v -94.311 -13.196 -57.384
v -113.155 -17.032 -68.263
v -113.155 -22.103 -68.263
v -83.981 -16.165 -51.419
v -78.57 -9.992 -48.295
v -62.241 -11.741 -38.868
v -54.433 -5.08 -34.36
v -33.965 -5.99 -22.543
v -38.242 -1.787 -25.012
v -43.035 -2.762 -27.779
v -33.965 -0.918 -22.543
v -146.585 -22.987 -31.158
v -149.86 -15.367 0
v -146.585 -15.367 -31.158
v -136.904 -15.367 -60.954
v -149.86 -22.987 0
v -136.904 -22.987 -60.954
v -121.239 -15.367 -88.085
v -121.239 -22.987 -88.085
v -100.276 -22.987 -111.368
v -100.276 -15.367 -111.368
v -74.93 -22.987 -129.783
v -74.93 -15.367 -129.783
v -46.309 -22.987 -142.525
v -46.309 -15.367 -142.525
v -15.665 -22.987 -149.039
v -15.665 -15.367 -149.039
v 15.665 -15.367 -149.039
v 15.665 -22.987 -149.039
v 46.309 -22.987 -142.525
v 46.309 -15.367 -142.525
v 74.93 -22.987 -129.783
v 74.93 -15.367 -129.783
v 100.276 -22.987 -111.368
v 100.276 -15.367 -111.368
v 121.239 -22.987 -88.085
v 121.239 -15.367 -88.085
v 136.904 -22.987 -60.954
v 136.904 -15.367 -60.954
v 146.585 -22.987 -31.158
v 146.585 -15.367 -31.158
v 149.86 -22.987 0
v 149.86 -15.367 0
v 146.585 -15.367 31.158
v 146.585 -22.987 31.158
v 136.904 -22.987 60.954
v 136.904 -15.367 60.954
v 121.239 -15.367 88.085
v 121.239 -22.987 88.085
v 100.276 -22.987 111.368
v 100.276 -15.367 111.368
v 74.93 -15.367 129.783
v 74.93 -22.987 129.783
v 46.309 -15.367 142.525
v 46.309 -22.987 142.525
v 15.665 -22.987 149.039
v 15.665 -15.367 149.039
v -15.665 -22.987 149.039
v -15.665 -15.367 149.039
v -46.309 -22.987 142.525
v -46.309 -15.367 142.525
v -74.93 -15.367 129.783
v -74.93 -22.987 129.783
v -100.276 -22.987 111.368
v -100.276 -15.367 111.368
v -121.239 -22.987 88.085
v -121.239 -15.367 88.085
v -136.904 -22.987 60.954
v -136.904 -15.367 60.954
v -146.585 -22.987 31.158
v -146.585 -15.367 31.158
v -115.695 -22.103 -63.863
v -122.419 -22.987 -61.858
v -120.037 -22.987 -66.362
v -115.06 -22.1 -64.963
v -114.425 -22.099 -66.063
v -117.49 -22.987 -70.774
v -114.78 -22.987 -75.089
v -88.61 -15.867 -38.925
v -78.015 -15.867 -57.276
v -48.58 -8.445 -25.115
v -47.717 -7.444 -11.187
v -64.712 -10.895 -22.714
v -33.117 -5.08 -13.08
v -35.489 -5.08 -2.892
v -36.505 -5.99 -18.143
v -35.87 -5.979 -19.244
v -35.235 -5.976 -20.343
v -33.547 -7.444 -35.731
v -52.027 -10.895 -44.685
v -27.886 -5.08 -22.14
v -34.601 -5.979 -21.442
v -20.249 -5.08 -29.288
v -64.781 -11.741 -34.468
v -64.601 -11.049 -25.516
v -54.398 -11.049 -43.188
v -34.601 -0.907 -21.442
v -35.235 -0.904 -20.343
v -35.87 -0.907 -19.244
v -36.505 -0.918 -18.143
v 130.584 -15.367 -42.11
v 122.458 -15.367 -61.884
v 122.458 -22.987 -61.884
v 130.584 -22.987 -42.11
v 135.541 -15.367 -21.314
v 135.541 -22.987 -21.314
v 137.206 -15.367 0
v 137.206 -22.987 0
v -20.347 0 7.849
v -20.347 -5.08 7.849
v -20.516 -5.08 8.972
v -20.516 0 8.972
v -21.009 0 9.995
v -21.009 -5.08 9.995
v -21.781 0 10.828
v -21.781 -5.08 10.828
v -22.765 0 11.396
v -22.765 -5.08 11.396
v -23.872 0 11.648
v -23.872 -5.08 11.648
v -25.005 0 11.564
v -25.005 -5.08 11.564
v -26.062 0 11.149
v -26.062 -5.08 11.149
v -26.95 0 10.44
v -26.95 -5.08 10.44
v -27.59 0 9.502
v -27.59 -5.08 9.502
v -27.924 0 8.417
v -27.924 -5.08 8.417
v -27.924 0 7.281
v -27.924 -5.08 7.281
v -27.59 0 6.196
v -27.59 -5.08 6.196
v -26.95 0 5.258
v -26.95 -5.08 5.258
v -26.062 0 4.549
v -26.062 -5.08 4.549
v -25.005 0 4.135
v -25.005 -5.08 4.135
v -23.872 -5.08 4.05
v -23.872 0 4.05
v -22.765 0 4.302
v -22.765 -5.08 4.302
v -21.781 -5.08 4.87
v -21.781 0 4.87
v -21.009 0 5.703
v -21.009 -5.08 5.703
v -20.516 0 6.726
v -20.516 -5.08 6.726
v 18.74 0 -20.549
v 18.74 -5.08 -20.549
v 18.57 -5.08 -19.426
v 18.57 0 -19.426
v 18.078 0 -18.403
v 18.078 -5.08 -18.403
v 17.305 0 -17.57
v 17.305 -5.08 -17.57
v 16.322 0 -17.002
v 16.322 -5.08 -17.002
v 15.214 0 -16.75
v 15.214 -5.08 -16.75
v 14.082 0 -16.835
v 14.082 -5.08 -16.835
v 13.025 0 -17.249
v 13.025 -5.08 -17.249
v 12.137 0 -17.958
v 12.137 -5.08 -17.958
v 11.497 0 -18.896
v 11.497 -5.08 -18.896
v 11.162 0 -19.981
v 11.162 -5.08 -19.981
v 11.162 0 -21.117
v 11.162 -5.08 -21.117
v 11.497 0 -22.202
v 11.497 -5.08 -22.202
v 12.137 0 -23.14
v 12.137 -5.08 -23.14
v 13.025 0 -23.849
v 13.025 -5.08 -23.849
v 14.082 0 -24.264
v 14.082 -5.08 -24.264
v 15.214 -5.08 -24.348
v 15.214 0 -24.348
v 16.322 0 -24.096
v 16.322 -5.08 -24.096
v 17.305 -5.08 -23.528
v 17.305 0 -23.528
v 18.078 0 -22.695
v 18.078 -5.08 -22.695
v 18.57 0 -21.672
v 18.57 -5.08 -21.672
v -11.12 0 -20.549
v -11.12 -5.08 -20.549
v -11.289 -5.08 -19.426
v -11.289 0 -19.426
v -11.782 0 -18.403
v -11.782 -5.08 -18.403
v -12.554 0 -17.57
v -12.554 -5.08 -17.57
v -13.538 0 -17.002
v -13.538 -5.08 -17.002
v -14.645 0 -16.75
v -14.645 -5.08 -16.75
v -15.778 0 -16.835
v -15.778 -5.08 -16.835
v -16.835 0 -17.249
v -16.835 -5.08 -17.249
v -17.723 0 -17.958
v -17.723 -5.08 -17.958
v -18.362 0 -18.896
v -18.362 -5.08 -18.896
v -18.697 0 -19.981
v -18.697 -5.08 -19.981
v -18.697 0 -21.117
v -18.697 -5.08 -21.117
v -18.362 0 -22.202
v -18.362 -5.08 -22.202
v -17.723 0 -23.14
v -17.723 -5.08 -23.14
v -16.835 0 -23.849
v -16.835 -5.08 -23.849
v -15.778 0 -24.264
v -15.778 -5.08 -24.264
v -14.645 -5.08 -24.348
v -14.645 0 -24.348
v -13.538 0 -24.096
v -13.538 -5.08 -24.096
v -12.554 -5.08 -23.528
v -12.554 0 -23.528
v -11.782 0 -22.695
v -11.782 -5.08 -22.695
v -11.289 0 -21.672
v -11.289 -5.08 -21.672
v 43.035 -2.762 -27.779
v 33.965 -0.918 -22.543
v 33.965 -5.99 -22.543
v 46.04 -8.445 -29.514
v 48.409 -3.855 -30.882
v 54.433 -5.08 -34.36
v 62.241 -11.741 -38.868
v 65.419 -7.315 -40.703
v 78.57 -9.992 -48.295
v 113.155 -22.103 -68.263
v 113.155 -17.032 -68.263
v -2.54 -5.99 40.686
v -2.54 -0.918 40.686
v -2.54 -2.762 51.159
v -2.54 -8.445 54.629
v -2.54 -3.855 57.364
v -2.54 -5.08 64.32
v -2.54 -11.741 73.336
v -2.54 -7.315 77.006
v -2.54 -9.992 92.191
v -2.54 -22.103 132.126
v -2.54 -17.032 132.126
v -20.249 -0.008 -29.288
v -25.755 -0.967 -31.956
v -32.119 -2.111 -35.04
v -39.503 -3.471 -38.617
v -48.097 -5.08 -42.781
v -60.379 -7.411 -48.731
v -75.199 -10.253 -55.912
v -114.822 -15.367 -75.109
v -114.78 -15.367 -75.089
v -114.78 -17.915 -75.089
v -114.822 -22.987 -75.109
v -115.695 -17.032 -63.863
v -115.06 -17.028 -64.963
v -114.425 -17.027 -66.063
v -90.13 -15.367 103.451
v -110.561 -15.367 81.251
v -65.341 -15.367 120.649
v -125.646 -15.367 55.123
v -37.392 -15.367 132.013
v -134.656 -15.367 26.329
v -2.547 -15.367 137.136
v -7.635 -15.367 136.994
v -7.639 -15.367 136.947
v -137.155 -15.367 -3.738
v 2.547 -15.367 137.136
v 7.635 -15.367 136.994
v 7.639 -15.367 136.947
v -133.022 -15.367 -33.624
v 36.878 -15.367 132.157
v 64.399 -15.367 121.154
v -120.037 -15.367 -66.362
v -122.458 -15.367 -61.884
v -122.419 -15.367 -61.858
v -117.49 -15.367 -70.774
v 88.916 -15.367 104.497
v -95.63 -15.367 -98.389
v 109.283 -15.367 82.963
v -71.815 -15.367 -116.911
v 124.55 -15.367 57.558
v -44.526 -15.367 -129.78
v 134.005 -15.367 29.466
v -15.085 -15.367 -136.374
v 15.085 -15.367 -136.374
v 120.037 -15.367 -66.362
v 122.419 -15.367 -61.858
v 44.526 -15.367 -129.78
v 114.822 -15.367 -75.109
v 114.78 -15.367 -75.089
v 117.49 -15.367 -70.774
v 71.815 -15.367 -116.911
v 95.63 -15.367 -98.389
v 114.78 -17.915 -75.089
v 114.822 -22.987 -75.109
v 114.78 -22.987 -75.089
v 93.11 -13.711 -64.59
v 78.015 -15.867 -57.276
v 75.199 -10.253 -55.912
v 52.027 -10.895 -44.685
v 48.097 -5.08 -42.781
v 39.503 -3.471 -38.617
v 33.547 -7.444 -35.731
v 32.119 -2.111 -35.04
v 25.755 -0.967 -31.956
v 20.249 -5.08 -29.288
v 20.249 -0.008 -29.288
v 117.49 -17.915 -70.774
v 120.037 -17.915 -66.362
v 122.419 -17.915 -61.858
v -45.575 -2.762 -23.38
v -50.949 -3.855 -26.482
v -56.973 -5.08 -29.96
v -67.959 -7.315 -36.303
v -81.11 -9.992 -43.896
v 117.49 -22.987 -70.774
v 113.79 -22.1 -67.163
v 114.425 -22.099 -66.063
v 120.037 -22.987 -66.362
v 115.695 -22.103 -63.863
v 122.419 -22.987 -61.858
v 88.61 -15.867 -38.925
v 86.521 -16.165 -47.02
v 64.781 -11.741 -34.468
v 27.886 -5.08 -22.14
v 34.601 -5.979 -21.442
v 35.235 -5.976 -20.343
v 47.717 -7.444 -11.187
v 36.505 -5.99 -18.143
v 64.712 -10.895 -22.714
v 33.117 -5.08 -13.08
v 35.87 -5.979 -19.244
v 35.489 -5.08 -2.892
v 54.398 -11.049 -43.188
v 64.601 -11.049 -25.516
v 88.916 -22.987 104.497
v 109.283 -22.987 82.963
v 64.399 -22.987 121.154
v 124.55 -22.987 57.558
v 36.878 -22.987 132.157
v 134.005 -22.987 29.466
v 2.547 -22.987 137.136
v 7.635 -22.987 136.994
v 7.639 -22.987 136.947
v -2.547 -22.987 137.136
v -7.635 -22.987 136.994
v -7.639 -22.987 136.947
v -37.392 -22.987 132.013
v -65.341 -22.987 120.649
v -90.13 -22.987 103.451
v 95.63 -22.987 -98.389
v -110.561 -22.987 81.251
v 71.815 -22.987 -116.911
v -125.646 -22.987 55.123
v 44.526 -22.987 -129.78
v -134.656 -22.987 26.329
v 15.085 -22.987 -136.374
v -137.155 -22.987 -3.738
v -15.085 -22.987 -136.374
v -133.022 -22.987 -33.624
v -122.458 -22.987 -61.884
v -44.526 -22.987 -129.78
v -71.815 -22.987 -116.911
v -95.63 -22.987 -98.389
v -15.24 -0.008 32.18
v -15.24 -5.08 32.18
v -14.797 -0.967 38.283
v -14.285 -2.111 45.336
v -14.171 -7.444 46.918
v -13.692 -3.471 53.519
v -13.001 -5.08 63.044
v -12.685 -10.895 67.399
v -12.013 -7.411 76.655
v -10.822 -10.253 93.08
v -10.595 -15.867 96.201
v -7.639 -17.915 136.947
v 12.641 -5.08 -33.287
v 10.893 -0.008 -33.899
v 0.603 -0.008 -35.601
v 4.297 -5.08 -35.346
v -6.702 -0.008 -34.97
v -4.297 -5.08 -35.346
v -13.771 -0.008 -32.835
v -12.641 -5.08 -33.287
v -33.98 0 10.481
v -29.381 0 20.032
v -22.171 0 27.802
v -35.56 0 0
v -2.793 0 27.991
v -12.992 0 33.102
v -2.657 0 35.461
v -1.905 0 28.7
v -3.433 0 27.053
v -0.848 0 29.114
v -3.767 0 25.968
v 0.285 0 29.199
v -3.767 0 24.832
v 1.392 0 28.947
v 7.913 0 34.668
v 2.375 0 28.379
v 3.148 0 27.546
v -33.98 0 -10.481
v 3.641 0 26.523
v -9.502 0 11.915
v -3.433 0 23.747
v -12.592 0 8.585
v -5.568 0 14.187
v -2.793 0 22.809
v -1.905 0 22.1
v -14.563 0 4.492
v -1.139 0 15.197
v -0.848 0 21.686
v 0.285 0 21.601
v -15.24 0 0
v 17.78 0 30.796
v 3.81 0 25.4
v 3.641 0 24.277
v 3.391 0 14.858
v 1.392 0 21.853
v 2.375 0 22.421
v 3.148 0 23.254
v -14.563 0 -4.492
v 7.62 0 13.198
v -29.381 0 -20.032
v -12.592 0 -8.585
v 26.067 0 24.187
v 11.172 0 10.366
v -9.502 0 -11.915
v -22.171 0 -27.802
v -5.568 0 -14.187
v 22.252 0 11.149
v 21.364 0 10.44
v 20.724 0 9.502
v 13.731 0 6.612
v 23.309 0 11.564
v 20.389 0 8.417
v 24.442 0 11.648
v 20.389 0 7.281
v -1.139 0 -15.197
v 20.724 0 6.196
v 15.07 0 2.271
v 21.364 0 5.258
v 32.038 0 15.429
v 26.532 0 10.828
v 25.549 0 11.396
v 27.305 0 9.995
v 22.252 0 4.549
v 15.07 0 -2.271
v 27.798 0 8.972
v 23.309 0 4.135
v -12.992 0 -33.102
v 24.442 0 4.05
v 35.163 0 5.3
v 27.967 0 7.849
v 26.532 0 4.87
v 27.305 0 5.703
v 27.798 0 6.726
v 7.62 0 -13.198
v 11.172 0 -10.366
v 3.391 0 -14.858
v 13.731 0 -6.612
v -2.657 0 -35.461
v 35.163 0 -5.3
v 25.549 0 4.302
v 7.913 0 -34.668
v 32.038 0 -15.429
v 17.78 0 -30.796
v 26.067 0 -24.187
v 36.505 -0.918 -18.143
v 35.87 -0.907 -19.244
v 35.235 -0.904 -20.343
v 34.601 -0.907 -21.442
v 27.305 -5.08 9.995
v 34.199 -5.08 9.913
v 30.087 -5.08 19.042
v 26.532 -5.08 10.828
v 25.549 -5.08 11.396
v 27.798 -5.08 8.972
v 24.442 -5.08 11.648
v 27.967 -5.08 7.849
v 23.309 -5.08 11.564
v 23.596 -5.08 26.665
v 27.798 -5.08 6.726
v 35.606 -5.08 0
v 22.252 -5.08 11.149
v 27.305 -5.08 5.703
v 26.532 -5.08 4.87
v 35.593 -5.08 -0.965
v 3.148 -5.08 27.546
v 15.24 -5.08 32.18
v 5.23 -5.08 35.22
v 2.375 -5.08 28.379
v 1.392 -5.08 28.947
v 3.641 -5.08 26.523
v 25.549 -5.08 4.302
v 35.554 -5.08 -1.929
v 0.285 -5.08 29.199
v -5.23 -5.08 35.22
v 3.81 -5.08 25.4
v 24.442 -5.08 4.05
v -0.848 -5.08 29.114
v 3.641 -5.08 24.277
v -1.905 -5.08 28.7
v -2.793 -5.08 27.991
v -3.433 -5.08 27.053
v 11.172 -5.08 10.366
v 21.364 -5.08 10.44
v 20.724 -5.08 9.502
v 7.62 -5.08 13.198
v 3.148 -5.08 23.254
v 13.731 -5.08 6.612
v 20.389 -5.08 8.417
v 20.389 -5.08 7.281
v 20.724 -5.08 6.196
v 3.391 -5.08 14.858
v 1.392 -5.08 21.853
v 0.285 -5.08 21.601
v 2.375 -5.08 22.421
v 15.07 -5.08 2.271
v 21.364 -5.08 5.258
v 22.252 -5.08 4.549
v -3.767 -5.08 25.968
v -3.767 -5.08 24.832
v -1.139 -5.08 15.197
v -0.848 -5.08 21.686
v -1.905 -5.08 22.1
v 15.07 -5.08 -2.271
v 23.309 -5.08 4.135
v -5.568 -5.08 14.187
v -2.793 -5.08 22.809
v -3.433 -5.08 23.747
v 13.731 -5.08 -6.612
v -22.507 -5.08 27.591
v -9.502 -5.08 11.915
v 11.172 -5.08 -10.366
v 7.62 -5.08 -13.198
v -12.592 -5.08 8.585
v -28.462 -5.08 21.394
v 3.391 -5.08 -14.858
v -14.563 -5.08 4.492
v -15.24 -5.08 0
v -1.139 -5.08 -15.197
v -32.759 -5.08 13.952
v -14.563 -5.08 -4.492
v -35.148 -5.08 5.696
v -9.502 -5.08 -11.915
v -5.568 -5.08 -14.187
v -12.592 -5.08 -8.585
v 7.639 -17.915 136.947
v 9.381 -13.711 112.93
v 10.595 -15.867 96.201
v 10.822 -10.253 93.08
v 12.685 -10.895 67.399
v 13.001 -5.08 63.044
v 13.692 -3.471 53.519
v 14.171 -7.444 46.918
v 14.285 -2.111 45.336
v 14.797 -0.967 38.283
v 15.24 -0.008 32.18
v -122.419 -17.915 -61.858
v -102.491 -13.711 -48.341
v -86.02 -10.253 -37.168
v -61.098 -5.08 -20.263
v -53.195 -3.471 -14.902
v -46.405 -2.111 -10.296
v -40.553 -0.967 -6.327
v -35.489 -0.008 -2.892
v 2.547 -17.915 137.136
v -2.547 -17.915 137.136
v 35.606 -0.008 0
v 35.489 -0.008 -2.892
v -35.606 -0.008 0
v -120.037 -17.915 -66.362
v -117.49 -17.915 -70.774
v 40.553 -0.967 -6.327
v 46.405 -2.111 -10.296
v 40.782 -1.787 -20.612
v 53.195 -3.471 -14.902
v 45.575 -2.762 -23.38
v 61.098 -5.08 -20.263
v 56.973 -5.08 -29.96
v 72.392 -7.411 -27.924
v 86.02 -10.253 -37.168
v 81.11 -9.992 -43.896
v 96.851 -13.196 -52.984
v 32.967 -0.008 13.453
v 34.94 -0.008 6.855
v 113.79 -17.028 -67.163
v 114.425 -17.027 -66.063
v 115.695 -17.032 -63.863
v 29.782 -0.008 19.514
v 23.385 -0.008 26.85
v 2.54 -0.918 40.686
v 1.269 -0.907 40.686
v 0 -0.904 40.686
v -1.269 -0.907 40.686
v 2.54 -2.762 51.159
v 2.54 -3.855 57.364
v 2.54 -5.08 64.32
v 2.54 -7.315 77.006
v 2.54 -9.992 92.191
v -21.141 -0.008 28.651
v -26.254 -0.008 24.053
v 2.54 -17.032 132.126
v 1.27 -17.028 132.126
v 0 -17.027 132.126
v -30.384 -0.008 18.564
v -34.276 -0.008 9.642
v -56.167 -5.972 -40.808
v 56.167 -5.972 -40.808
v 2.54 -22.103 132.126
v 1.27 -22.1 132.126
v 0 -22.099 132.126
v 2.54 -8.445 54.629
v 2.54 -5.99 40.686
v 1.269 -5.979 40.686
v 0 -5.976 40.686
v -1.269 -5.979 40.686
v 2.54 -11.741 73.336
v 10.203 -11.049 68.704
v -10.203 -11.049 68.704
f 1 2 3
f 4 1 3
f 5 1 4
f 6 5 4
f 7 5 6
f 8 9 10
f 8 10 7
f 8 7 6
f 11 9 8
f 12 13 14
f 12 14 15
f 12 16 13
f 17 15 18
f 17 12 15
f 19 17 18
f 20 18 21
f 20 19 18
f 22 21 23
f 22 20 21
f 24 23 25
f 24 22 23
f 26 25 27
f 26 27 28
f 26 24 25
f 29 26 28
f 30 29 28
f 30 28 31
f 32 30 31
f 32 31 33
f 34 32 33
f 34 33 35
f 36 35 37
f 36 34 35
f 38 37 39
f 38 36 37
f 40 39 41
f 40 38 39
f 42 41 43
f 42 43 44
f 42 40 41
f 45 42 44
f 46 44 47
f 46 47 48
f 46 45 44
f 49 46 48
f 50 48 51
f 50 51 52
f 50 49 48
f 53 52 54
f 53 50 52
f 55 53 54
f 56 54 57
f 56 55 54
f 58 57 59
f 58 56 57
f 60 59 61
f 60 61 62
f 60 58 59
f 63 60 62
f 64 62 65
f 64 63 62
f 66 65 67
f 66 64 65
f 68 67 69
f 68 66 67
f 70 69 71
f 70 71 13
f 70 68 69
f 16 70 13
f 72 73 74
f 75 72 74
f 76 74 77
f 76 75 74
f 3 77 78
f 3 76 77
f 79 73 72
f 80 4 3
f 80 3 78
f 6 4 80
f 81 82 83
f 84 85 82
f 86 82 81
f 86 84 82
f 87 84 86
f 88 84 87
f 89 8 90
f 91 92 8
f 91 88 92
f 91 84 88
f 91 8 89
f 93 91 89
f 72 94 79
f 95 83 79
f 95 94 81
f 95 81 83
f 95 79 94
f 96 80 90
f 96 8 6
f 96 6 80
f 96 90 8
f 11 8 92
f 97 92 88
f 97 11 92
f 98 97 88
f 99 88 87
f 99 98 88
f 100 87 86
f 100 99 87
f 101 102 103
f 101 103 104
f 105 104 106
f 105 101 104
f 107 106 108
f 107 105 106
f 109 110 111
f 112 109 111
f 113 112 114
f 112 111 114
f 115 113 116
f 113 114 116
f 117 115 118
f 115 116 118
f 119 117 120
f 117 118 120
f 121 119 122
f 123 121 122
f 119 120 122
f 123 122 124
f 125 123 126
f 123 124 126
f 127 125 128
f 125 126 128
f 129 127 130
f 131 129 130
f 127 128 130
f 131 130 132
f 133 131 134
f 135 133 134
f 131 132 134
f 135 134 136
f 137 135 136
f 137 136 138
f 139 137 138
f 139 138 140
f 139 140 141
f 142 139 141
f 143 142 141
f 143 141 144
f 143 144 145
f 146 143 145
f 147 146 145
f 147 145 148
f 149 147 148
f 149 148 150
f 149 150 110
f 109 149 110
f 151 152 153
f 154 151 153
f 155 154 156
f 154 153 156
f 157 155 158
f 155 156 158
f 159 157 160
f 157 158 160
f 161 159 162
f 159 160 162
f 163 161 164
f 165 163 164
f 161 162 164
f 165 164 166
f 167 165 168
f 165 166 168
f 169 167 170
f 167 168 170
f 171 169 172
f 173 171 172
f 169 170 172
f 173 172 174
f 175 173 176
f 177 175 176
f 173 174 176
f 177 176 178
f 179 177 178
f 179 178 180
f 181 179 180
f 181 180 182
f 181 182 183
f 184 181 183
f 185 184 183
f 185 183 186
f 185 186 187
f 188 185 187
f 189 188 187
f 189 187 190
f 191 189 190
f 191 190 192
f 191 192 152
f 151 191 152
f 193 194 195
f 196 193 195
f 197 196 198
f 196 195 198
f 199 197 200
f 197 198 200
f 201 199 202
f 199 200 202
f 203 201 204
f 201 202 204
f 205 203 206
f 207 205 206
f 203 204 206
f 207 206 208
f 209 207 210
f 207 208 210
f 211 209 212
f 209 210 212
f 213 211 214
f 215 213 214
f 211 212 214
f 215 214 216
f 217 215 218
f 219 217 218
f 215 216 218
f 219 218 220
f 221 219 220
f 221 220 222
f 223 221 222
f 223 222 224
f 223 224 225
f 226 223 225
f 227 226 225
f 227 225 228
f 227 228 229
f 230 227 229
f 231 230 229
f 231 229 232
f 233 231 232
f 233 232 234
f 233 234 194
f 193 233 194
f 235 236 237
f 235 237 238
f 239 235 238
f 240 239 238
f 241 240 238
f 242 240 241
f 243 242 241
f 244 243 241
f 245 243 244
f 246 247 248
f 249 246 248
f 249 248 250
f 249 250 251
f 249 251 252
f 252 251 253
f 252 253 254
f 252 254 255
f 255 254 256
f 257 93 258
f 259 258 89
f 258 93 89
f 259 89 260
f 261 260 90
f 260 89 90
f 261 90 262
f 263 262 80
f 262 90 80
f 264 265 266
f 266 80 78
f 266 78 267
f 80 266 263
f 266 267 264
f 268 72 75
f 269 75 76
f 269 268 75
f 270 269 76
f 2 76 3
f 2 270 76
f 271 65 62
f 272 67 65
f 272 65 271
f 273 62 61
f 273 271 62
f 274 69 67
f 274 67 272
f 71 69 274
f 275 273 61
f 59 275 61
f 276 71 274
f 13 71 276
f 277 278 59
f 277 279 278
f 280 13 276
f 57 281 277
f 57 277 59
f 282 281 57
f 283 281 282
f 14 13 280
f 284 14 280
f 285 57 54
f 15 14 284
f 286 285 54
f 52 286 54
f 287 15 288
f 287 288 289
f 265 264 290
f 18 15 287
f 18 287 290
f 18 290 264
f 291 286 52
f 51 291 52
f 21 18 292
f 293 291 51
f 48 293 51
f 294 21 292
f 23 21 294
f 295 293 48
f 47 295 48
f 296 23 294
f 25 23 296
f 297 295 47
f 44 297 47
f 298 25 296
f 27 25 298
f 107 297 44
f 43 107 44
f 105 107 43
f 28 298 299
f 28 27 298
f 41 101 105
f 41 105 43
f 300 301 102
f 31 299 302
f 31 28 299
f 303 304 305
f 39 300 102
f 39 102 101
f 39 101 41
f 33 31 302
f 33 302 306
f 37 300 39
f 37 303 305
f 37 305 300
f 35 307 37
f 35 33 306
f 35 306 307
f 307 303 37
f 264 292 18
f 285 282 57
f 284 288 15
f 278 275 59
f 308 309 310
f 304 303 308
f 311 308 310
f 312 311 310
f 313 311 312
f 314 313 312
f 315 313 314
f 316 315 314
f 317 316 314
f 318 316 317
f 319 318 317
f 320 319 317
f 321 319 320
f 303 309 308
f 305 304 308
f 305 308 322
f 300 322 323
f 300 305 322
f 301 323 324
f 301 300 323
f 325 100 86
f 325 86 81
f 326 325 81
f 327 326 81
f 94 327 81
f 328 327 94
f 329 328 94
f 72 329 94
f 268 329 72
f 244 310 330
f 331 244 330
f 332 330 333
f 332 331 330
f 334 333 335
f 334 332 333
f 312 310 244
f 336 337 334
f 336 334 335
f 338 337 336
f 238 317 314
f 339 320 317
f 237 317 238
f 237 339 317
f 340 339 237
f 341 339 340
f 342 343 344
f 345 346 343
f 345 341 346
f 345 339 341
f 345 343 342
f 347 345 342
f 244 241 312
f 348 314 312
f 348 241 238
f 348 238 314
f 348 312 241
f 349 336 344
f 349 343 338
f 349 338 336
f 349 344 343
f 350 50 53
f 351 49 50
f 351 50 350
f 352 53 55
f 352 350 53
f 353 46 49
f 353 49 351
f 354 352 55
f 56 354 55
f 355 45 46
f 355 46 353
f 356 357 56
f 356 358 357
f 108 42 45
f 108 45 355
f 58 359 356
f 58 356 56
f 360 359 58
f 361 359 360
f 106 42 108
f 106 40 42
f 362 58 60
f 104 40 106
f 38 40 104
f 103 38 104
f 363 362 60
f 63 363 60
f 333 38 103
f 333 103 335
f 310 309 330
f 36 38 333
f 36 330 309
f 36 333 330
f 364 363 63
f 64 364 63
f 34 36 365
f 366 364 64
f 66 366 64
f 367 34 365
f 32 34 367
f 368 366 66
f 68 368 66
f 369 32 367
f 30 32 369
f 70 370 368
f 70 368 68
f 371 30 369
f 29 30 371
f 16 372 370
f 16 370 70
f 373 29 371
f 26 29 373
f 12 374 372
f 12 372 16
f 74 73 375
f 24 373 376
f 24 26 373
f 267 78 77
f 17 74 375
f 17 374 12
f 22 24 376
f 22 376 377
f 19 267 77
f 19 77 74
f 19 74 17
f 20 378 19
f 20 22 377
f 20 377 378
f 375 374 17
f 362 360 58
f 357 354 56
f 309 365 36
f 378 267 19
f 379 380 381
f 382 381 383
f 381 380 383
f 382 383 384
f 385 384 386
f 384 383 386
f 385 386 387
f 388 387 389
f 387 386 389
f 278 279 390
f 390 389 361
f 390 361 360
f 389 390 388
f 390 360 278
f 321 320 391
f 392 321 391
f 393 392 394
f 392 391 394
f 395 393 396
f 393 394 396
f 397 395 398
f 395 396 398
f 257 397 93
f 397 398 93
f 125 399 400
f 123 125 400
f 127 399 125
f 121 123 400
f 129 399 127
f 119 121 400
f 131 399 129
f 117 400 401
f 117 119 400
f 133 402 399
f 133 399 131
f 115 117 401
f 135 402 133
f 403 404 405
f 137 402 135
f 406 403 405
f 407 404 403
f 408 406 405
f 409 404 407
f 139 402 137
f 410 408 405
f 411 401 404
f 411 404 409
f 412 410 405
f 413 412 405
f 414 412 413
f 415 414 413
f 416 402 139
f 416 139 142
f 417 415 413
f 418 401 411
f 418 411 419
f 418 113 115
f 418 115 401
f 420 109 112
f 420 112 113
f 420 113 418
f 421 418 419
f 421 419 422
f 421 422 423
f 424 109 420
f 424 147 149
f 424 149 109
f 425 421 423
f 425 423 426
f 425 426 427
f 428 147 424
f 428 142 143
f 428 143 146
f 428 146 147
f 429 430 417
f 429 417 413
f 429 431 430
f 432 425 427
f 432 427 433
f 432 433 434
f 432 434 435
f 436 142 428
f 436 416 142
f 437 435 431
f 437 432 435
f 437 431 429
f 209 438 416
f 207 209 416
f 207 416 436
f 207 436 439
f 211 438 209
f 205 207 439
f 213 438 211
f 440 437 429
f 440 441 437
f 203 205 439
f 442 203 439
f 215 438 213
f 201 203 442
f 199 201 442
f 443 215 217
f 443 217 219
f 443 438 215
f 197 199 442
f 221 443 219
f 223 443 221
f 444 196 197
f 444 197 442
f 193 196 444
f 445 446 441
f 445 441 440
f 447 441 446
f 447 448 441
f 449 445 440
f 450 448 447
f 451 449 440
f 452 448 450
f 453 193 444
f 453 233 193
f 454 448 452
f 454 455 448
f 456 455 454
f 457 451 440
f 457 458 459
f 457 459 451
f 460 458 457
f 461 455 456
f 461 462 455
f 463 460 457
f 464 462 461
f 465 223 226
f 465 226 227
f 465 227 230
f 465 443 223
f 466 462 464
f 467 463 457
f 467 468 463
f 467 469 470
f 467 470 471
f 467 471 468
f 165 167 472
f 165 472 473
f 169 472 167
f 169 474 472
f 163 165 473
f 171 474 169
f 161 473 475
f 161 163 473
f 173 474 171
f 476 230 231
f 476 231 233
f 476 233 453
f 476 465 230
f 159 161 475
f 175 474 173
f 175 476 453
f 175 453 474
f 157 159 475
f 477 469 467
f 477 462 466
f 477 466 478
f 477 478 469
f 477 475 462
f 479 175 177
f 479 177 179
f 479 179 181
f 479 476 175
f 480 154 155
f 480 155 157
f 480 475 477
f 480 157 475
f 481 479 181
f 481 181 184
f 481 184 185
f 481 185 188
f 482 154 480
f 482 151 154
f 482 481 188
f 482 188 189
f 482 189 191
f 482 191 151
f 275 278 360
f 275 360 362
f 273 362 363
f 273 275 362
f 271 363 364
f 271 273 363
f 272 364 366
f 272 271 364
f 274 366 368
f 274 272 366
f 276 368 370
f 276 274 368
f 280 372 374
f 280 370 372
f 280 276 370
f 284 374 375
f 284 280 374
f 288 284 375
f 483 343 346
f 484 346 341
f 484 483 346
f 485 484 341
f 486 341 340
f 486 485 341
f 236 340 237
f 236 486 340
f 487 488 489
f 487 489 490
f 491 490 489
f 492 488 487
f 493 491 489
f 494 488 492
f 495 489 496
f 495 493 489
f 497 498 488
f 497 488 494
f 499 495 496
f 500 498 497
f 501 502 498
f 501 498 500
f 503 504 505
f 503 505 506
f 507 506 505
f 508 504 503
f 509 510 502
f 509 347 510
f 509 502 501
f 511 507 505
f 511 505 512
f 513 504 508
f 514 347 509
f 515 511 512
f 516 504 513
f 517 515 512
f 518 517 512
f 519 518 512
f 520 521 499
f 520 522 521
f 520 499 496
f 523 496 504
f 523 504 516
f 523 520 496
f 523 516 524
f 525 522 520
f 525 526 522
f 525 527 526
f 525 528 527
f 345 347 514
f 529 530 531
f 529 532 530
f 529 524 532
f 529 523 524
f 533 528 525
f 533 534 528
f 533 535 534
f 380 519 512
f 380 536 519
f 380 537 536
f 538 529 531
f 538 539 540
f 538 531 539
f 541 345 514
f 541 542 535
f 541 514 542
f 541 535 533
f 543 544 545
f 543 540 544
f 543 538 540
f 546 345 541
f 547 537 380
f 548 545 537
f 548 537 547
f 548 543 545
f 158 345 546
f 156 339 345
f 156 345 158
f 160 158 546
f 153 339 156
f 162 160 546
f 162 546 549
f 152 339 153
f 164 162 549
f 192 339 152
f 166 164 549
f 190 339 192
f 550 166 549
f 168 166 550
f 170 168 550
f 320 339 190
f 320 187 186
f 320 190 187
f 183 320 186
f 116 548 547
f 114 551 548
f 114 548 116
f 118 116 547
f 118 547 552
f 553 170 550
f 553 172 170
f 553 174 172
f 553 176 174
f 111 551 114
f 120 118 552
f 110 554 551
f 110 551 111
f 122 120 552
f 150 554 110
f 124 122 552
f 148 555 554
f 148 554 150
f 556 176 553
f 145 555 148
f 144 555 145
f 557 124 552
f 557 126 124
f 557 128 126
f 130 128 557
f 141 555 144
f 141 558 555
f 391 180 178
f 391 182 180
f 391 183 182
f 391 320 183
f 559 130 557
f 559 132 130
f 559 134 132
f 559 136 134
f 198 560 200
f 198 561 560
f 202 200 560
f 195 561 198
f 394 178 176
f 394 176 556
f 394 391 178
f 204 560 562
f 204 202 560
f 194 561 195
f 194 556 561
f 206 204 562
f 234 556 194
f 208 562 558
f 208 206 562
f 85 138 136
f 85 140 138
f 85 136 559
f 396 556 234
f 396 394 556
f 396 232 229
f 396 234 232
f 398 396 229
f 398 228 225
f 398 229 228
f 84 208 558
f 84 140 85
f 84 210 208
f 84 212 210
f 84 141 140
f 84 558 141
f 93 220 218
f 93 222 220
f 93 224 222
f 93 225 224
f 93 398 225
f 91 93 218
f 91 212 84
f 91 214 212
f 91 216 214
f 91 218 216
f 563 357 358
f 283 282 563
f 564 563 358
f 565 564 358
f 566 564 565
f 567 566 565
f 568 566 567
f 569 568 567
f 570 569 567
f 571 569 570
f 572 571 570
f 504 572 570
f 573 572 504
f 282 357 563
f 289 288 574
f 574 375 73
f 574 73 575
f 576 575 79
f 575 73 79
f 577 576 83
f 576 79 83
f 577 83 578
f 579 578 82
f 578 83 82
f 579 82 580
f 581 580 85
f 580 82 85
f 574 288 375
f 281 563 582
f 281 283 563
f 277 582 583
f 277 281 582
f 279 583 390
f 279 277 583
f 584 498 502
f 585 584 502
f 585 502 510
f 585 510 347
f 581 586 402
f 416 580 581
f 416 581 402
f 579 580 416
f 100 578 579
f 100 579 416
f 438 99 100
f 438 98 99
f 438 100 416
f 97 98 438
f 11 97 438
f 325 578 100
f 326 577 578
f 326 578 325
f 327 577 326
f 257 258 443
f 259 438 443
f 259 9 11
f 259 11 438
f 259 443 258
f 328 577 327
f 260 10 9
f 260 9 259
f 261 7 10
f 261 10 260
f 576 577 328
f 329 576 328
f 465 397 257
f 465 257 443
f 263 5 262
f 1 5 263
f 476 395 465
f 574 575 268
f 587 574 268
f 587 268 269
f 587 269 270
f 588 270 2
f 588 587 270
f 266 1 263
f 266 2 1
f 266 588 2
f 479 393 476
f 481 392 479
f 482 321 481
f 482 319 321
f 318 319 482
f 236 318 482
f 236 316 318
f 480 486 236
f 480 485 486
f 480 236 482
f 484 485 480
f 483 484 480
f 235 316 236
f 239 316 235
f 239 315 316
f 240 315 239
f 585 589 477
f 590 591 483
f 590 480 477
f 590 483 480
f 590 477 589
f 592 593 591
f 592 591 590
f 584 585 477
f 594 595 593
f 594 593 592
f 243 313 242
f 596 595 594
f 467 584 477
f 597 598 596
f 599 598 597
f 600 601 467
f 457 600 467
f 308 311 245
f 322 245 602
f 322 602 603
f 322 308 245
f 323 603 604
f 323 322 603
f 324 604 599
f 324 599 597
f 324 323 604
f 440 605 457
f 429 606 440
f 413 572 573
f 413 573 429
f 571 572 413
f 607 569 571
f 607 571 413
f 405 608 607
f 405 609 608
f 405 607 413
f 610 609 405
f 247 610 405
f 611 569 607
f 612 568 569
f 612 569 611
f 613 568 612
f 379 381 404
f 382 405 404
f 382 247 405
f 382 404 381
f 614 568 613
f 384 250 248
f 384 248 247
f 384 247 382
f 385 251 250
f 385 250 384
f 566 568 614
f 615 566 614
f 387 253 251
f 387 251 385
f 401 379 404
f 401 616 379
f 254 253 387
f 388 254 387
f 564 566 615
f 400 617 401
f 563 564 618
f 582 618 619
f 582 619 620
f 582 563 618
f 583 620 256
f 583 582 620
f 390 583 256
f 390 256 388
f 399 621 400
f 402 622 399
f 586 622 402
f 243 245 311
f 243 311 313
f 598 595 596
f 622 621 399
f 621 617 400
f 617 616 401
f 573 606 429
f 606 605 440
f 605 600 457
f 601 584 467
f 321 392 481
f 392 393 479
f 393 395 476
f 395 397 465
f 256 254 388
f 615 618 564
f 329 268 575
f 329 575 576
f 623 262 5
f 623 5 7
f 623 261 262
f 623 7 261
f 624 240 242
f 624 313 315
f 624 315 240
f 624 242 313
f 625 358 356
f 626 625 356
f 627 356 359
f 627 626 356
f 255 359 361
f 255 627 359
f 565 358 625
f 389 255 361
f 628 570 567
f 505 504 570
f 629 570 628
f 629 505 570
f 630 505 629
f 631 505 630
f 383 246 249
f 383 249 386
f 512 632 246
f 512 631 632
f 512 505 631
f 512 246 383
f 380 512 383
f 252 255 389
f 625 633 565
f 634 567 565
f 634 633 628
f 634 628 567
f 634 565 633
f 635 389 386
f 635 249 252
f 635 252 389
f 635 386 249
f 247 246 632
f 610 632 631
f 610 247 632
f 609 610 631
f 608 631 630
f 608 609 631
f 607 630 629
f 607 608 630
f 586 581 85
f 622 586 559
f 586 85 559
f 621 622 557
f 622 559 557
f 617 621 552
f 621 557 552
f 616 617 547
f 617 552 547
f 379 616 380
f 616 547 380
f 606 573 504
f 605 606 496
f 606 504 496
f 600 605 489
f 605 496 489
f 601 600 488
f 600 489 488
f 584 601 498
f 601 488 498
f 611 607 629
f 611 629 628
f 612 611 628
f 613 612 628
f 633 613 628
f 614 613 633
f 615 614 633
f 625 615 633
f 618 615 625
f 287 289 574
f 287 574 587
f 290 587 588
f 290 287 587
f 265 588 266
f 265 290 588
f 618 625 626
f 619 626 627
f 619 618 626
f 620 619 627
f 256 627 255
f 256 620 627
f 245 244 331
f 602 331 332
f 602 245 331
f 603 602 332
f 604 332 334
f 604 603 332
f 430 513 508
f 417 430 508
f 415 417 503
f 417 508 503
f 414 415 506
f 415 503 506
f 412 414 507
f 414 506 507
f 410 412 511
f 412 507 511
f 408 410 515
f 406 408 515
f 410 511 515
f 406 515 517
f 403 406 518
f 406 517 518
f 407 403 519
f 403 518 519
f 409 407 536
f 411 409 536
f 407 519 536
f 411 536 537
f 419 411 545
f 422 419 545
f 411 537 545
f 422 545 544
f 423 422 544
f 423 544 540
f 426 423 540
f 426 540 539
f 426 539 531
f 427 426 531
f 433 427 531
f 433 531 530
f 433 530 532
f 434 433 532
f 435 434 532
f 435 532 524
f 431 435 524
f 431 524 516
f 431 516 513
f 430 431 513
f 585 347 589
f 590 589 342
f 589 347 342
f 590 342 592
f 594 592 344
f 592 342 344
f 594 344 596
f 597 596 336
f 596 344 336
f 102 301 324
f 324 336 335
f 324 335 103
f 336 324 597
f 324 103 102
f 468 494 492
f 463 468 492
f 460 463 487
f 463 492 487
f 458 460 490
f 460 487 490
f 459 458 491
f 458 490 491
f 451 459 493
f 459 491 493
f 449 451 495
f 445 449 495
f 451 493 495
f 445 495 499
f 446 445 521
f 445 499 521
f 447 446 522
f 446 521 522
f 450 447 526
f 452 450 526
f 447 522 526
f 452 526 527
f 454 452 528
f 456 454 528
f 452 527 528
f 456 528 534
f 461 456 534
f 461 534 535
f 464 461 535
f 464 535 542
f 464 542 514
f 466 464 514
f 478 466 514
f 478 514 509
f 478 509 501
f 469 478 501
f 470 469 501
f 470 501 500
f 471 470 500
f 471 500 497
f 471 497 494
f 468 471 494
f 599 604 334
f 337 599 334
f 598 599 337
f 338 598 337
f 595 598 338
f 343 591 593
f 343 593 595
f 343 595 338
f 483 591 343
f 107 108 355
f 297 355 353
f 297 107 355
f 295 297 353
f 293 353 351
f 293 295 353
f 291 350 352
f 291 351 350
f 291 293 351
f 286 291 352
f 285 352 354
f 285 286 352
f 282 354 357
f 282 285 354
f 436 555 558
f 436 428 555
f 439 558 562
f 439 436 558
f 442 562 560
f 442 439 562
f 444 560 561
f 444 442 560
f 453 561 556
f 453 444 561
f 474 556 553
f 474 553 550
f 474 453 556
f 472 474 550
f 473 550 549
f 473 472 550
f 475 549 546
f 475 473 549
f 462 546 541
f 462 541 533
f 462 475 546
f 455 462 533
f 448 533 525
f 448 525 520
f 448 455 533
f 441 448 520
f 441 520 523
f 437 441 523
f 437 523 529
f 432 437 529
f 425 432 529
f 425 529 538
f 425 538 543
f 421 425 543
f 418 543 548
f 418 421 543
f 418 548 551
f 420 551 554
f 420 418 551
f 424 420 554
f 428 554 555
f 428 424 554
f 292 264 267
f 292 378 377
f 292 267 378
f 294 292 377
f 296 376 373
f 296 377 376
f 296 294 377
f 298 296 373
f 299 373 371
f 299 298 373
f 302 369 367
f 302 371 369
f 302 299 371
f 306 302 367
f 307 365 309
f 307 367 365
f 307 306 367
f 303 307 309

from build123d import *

# Parameters (mm, degrees)
F2_W          = 2.54
F2_H          = 91.44
F2_R          = 3.81
F3_DEPTH      = 17.907674907
F3_DEPTH_BACK = 5.081
F4_DEPTH      = 17.907674907
F4_DEPTH_BACK = 5.081


with BuildPart() as f1:
    # F0 (on Top) → F1 (revolve)
    with BuildSketch(Plane.XY):
        Polygon((-15.24, -5.08), (-15.24, 0), (-35.56, 0), (-137.16, -17.91482124), (-137.16, -15.366674907), (-149.86, -15.366674907), (-149.86, -22.986674907), (-137.16, -22.986674907), (-35.60620015, -5.08), align=None)
    revolve(axis=Axis((0, -3.722413492, 0), (0, -1, 0)))

    # F2 (on face) → F3 (cut, two sides)
    with BuildSketch(Plane.XZ.offset(5.08)) as f3_sk:
        Polygon((-114.4246458354, -66.063100075), (-35.2352829134, -20.343100075), (-36.5052829134, -18.1433955494), (-115.6946458354, -63.8633955494), align=None)
        Polygon((-33.9652829134, -22.5428046006), (-35.2352829134, -20.343100075), (-114.4246458354, -66.063100075), (-113.1546458354, -68.2628046006), align=None)
        with Locations((-1.27, 86.40620015)):
            Rectangle(F2_W, F2_H)
        with Locations((1.27, 86.40620015)):
            Rectangle(F2_W, F2_H)
        Polygon((114.4246458354, -66.063100075), (35.2352829134, -20.343100075), (33.9652829134, -22.5428046006), (113.1546458354, -68.2628046006), align=None)
        Polygon((36.5052829134, -18.1433955494), (35.2352829134, -20.343100075), (114.4246458354, -66.063100075), (115.6946458354, -63.8633955494), align=None)
        with Locations((0, 25.4)):
            Circle(F2_R)
        with Locations((-24.1568355139, 7.8490316571)):
            Circle(F2_R)
        with Locations((24.1568355139, 7.8490316571)):
            Circle(F2_R)
        with Locations((14.9297454082, -20.5490316571)):
            Circle(F2_R)
        with Locations((-14.9297454082, -20.5490316571)):
            Circle(F2_R)
    extrude(amount=F3_DEPTH, mode=Mode.SUBTRACT)
    extrude(f3_sk.sketch, amount=-F3_DEPTH_BACK, mode=Mode.SUBTRACT)

    # F2 (on face) → F4 (cut, two sides)
    with BuildSketch(Plane.XZ.offset(5.08)) as f4_sk:
        with BuildLine():
            Line((7.6354261028, 136.9935824331), (15.24, 32.1798677611))
            ThreePointArc((15.24, 32.1798677611), (30.0868740434, 19.041572924), (35.60620015, 0))
            ThreePointArc((35.60620015, 0), (35.5767837041, -1.4470488585), (35.4885829716, -2.8917067269))
            Line((35.4885829716, -2.8917067269), (122.4576355939, -61.8843182428))
            ThreePointArc((122.4576355939, -61.8843182428), (133.4681389299, -31.808760589), (137.20620015, 0))
            ThreePointArc((137.20620015, 0), (99.6824186146, 94.2812641979), (7.6354261028, 136.9935824331))
        make_face()
        with BuildLine():
            ThreePointArc((-35.4885829716, -2.8917067269), (-30.8358738622, 17.803100075), (-15.24, 32.1798677612))
            Line((-15.24, 32.1798677611), (-7.6354261028, 136.9935824331))
            ThreePointArc((-7.6354261028, 136.9935824331), (-118.8240548867, 68.603100075), (-122.4576355939, -61.8843182428))
            Line((-122.4576355939, -61.8843182428), (-35.4885829716, -2.8917067269))
        make_face()
        with BuildLine():
            ThreePointArc((20.2485829716, -29.2881610342), (0, -35.60620015), (-20.2485829716, -29.2881610342))
            Line((-20.2485829716, -29.2881610342), (-114.822209491, -75.1092641903))
            ThreePointArc((-114.822209491, -75.1092641903), (0, -137.20620015), (114.822209491, -75.1092641903))
            Line((114.822209491, -75.1092641903), (20.2485829716, -29.2881610342))
        make_face()
    extrude(amount=F4_DEPTH, mode=Mode.SUBTRACT)
    extrude(f4_sk.sketch, amount=-F4_DEPTH_BACK, mode=Mode.SUBTRACT)


solid = f1.part
